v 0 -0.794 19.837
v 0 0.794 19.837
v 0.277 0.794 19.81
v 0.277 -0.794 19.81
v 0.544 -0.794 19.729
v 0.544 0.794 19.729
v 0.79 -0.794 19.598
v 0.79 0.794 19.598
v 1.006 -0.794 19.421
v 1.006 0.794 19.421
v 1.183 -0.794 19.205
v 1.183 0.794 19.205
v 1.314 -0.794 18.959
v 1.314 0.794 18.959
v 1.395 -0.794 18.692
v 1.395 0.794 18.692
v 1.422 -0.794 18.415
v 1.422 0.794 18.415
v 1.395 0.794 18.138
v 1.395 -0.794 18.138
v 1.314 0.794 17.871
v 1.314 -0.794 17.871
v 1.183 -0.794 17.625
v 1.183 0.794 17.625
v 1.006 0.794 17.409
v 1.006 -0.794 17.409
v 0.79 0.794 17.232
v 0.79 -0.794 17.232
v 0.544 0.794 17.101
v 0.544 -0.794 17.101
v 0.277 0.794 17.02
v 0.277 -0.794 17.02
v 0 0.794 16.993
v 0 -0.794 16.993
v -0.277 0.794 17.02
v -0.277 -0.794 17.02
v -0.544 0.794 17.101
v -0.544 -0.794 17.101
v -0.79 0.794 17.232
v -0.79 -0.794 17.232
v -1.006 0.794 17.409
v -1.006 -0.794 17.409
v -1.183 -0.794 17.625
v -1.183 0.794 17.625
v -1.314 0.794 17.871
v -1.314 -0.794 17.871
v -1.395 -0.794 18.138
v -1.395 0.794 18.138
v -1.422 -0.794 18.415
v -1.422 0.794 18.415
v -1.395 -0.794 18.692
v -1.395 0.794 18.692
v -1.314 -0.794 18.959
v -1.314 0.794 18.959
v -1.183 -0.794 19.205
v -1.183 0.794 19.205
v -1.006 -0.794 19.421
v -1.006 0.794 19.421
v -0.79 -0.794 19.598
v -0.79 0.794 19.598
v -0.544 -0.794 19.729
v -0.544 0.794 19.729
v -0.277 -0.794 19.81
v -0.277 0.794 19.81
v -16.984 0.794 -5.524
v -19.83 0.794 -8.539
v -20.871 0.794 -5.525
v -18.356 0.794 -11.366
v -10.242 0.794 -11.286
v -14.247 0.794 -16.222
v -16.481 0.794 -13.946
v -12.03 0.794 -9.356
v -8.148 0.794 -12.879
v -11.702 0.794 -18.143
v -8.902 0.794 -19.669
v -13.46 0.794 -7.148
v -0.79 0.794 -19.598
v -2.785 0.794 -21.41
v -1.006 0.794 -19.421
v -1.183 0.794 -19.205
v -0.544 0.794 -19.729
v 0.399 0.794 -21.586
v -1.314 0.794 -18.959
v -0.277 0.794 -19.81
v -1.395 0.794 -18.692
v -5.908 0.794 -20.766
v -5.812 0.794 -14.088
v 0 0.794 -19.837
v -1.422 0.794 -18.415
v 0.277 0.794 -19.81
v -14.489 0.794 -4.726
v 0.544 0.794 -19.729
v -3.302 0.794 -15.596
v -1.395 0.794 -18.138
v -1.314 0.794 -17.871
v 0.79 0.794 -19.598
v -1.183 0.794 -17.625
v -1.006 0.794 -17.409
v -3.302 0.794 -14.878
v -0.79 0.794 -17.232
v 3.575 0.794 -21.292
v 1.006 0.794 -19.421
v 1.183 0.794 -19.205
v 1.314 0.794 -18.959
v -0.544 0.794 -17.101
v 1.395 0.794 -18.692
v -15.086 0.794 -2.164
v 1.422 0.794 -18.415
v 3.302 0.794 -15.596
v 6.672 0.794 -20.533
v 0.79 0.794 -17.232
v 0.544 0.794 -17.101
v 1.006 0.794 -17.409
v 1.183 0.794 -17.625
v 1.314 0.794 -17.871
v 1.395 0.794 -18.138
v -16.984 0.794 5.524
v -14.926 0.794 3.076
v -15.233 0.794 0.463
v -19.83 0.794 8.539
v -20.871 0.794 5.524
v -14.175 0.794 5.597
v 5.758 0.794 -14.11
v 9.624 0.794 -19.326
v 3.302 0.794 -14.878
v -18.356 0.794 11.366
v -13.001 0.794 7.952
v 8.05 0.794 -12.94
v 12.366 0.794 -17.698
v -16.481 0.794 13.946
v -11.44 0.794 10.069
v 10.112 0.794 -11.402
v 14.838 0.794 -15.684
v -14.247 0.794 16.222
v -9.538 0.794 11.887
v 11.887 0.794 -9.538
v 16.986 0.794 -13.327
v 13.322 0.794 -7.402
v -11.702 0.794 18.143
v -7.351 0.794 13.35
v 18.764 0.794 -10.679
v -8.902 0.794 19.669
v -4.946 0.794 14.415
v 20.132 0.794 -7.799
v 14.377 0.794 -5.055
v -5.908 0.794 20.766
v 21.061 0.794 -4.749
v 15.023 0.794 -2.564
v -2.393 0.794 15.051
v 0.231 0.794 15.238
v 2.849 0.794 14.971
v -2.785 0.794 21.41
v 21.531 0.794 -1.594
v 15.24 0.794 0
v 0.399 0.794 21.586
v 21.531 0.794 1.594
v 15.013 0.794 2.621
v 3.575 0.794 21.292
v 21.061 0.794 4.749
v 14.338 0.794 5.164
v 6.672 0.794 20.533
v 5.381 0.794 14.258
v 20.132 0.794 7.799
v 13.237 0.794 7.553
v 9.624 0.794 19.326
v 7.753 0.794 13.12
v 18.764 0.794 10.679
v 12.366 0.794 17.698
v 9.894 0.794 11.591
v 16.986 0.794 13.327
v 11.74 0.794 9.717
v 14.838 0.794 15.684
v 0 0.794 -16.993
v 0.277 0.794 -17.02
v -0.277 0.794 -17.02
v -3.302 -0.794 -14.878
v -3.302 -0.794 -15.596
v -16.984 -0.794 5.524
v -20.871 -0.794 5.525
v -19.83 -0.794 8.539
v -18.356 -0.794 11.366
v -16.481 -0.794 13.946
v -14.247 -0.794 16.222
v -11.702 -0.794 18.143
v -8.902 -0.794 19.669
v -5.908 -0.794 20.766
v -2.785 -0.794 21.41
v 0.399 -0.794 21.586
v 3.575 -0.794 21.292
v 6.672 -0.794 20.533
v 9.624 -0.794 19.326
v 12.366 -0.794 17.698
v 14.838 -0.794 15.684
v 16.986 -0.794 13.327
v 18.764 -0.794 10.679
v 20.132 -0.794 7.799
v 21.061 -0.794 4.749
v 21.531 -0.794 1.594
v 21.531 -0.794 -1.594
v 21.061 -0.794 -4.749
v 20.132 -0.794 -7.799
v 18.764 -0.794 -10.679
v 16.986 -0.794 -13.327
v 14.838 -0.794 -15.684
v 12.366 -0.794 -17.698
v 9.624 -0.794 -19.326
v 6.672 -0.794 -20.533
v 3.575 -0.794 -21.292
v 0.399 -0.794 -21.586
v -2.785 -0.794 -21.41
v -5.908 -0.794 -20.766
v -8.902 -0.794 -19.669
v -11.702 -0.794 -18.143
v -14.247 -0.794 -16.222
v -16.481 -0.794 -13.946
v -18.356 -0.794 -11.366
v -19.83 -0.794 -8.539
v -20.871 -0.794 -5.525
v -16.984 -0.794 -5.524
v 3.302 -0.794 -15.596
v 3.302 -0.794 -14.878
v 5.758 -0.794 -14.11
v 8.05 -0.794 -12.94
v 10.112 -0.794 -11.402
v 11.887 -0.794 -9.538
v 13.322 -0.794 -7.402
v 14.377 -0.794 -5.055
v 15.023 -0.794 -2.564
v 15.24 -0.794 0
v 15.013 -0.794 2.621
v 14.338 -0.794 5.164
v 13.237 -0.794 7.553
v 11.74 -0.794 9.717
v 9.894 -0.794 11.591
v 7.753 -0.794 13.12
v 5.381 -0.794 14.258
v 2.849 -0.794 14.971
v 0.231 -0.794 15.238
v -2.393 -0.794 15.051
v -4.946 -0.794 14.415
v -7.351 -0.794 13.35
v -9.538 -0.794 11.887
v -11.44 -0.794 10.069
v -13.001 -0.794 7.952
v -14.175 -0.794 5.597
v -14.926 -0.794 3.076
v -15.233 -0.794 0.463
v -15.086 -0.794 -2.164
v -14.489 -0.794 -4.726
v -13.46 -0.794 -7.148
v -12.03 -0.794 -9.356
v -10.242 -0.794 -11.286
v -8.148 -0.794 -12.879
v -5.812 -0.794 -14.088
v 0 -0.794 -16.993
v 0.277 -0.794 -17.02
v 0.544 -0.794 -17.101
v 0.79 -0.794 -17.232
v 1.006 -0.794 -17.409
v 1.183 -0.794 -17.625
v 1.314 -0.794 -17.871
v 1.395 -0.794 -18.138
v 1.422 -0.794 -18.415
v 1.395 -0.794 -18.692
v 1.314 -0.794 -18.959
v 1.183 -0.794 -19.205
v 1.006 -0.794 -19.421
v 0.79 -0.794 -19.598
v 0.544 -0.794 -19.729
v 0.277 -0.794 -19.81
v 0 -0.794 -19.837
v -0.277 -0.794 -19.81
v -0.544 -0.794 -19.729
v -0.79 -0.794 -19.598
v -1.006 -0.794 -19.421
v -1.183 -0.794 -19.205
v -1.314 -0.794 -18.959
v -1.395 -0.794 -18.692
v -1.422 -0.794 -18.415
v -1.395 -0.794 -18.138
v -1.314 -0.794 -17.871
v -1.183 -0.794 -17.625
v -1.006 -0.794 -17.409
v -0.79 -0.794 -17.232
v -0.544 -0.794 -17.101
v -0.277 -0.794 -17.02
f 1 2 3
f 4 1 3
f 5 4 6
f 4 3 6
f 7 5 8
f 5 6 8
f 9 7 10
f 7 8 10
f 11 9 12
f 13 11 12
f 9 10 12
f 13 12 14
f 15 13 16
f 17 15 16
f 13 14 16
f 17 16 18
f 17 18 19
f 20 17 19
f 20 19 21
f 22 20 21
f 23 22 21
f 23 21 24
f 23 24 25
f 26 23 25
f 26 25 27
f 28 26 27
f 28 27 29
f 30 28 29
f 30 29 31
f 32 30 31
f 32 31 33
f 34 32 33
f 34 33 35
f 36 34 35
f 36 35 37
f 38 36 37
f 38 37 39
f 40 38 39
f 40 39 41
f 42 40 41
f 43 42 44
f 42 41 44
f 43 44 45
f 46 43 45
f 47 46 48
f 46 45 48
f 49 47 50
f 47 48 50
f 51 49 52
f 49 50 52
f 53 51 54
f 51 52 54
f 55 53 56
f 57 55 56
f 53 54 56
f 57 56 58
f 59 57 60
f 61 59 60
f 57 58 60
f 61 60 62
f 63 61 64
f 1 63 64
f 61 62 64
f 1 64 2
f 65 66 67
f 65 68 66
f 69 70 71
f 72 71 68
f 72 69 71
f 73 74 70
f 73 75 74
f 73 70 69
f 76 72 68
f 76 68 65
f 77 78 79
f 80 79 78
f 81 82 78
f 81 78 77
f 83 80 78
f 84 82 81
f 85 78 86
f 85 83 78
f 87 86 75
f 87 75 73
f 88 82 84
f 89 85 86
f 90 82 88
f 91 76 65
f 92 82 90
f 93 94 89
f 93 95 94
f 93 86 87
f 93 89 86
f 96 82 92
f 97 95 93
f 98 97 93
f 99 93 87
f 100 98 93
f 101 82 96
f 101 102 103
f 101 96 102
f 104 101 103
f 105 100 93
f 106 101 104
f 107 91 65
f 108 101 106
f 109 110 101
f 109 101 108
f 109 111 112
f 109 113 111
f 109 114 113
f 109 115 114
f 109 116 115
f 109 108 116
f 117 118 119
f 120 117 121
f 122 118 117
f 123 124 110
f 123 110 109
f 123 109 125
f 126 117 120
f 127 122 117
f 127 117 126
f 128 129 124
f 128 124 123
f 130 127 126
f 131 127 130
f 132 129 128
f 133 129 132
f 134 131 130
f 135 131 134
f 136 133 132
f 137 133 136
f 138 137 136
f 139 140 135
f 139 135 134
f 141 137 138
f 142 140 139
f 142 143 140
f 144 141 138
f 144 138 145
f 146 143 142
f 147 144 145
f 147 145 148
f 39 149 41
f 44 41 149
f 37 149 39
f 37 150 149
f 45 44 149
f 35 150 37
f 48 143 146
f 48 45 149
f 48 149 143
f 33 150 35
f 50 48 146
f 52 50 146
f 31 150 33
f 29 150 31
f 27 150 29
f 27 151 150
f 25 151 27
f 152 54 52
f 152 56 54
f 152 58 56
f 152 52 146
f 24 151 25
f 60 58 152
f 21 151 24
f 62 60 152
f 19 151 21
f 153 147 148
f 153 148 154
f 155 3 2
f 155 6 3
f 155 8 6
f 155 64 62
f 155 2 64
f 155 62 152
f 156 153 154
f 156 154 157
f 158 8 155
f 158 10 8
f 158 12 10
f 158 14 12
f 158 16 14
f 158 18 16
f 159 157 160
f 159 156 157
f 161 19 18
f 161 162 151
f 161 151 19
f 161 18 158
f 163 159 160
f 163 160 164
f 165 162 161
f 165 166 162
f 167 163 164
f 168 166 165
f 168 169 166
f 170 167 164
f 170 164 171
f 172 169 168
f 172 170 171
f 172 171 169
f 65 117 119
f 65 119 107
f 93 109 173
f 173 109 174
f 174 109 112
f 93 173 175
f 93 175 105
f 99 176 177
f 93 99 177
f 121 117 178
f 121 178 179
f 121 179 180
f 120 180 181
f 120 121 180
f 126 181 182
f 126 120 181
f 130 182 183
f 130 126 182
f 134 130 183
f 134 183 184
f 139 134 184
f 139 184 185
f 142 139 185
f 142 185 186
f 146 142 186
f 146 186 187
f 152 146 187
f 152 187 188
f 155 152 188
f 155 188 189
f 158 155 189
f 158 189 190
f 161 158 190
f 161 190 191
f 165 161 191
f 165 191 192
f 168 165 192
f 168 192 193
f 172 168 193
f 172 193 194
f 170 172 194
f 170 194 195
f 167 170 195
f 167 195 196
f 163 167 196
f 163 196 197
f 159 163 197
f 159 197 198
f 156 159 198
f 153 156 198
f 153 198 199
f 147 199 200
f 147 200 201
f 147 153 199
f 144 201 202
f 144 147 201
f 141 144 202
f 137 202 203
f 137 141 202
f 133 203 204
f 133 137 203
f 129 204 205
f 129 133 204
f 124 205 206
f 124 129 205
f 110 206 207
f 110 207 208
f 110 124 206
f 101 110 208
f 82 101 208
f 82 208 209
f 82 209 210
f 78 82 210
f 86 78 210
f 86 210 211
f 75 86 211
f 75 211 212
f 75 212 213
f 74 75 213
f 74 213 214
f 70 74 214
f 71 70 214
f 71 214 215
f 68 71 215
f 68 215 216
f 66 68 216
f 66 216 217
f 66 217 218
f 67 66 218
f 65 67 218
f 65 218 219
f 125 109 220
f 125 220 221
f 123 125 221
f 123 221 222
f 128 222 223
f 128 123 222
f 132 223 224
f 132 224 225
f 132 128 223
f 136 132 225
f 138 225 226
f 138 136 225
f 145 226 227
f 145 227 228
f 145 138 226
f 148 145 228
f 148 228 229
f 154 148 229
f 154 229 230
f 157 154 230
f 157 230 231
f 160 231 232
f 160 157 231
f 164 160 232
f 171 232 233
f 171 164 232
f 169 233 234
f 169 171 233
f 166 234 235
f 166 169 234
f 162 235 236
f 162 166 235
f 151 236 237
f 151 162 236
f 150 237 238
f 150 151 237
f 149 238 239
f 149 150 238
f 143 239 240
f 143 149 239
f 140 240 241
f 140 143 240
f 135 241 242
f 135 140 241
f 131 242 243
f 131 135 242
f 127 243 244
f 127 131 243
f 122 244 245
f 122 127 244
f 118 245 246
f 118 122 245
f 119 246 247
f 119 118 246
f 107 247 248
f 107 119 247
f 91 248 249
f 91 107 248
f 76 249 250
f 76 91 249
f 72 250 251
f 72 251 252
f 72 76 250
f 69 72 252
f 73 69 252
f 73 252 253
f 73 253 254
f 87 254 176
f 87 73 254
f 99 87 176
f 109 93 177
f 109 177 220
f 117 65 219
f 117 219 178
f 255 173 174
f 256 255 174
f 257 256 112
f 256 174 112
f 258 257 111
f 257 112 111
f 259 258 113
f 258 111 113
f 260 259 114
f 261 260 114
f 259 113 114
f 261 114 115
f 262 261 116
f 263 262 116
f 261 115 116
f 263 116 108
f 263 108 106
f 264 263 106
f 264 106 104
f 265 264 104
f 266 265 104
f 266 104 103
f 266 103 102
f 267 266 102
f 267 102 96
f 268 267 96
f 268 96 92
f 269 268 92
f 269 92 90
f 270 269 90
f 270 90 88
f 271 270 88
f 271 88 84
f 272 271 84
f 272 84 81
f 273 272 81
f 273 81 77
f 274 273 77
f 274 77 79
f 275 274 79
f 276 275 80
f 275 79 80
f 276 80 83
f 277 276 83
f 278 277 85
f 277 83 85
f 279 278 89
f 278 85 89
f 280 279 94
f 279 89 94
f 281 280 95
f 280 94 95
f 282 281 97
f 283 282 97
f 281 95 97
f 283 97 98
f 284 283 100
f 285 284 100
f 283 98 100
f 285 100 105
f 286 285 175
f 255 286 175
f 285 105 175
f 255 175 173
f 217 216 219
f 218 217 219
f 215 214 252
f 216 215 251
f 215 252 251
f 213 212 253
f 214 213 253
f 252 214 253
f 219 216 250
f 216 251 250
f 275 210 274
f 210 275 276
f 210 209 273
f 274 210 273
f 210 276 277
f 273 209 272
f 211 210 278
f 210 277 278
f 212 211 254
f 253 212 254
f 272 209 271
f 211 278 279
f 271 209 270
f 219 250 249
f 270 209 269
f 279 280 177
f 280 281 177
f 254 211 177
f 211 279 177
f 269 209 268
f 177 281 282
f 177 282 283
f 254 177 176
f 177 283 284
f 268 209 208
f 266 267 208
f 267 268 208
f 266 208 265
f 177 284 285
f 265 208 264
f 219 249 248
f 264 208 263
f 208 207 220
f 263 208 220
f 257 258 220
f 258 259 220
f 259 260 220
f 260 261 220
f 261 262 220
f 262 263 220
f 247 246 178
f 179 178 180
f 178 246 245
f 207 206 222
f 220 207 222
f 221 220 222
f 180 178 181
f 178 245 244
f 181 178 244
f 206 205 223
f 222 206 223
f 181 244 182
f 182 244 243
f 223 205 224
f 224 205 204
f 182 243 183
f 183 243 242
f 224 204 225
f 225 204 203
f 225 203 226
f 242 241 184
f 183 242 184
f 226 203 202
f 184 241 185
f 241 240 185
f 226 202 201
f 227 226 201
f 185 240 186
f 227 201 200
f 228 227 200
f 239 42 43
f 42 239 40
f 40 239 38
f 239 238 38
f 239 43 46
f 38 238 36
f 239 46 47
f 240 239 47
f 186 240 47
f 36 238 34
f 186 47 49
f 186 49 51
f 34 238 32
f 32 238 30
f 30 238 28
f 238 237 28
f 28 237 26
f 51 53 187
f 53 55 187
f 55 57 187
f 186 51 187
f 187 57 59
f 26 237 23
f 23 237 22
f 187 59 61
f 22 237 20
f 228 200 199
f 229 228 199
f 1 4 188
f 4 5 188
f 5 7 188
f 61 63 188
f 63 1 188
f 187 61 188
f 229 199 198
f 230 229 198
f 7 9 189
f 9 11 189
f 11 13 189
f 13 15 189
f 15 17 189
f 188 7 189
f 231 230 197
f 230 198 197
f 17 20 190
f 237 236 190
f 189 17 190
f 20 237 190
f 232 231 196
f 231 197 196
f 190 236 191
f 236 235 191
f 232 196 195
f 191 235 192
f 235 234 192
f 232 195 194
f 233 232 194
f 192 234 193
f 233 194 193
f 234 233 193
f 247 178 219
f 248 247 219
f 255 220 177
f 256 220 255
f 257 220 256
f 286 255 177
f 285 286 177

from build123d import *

# Parameters (mm, degrees)
SKETCH1_R           = 21.59
BOSS_EXTRUDE1_DEPTH = 0.79375
SKETCH2_R           = 1.4224
CUT_EXTRUDE1_DEPTH  = 31.574112518
CUT_EXTRUDE2_DEPTH  = 31.574112518


with BuildPart() as part:
    # Sketch1 → Boss-Extrude1 (new, symmetric)
    with BuildSketch(Plane(origin=(0, 0, 0), x_dir=(1, 0, 0), z_dir=(0, 1, 0))):
        with Locations(Location((0, 0, 0), (0, 0, 270))):
            Circle(SKETCH1_R)
        with BuildLine():
            Line((-3.302, 14.8779836), (-3.302, 15.5956))
            Line((-3.302, 15.5956), (3.302, 15.5956))
            Line((3.302, 15.5956), (3.302, 14.8779836))
            ThreePointArc((3.302, 14.8779836), (11.8865487, 9.537691545), (15.24, 0))
            ThreePointArc((15.24, 0), (-9.537691545, -11.8865487), (-3.302, 14.8779836))
        make_face(mode=Mode.SUBTRACT)
    extrude(amount=BOSS_EXTRUDE1_DEPTH, both=True)

    # Sketch2 → Cut-Extrude1 (cut, through all)
    with BuildSketch(Plane(origin=(0, 0.79375, 0), x_dir=(1, 0, 0), z_dir=(0, 1, 0))):
        with Locations(Location((0, 18.415, 0), (0, 0, 270))):
            Circle(SKETCH2_R)
        with Locations(Location((0, -18.415, 0), (0, 0, 270))):
            Circle(SKETCH2_R)
    extrude(amount=-CUT_EXTRUDE1_DEPTH, mode=Mode.SUBTRACT)

    # Sketch3 → Cut-Extrude2 (cut, through all)
    with BuildSketch(Plane(origin=(0, 0.79375, 0), x_dir=(1, 0, 0), z_dir=(0, 1, 0))):
        with BuildLine():
            Line((-20.871224203, 5.5245), (-16.984058744, 5.5245))
            Line((-16.984058744, 5.5245), (-16.984058744, -5.5245))
            Line((-16.984058744, -5.5245), (-20.871224203, -5.5245))
            ThreePointArc((-20.871224203, -5.5245), (-21.59, 0), (-20.871224203, 5.5245))
        make_face()
    extrude(amount=-CUT_EXTRUDE2_DEPTH, mode=Mode.SUBTRACT)


solid = part.part
